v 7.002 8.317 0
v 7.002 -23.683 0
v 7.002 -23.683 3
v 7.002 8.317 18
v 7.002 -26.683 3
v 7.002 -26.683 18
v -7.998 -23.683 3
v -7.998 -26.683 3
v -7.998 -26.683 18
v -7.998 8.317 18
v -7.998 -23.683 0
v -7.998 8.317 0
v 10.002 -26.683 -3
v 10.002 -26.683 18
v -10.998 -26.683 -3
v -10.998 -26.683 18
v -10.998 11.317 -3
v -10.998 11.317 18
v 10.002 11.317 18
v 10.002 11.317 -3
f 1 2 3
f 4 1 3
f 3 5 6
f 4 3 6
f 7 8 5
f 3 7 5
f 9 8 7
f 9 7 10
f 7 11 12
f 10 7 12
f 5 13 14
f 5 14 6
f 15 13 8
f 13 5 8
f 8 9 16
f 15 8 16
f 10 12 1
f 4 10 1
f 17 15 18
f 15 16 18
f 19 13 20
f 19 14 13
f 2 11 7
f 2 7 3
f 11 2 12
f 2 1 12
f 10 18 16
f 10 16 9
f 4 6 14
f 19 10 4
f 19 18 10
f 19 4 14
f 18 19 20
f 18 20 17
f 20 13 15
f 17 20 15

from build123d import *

# Parameters (mm, degrees)
SKETCH_1_W          = 21
SKETCH_1_H          = 38
SKETCH_1_W_2        = 15
SKETCH_1_H_2        = 32
EXTRUDE_1_DEPTH     = 18
SKETCH_2_W          = 21
SKETCH_2_H          = 38
EXTRUDE_2_DEPTH     = 3
SKETCH_3_W          = 15
SKETCH_3_H          = 15
CUT_EXTRUDE_1_DEPTH = 3


with BuildPart() as part:
    # 草圖1 → 填料-伸長1 (new body)
    with BuildSketch(Plane.XY):
        with Locations((-0.498060931, -7.683431953)):
            Rectangle(SKETCH_1_W, SKETCH_1_H)
        with Locations((-0.498060931, -7.683431953)):
            Rectangle(SKETCH_1_W_2, SKETCH_1_H_2, mode=Mode.SUBTRACT)
    extrude(amount=EXTRUDE_1_DEPTH)

    # 草圖2 → 填料-伸長2 (add)
    with BuildSketch(Plane(origin=(0, 0, 0), x_dir=(-1, 0, 0), z_dir=(0, 0, -1))):
        with Locations((0.498060931, -7.683431953)):
            Rectangle(SKETCH_2_W, SKETCH_2_H)
    extrude(amount=EXTRUDE_2_DEPTH)

    # 草圖3 → 除料-伸長1 (cut)
    with BuildSketch(Plane.XZ.offset(26.683431953)):
        with Locations((-0.498060931, 10.5)):
            Rectangle(SKETCH_3_W, SKETCH_3_H)
    extrude(amount=-CUT_EXTRUDE_1_DEPTH, mode=Mode.SUBTRACT)


solid = part.part
